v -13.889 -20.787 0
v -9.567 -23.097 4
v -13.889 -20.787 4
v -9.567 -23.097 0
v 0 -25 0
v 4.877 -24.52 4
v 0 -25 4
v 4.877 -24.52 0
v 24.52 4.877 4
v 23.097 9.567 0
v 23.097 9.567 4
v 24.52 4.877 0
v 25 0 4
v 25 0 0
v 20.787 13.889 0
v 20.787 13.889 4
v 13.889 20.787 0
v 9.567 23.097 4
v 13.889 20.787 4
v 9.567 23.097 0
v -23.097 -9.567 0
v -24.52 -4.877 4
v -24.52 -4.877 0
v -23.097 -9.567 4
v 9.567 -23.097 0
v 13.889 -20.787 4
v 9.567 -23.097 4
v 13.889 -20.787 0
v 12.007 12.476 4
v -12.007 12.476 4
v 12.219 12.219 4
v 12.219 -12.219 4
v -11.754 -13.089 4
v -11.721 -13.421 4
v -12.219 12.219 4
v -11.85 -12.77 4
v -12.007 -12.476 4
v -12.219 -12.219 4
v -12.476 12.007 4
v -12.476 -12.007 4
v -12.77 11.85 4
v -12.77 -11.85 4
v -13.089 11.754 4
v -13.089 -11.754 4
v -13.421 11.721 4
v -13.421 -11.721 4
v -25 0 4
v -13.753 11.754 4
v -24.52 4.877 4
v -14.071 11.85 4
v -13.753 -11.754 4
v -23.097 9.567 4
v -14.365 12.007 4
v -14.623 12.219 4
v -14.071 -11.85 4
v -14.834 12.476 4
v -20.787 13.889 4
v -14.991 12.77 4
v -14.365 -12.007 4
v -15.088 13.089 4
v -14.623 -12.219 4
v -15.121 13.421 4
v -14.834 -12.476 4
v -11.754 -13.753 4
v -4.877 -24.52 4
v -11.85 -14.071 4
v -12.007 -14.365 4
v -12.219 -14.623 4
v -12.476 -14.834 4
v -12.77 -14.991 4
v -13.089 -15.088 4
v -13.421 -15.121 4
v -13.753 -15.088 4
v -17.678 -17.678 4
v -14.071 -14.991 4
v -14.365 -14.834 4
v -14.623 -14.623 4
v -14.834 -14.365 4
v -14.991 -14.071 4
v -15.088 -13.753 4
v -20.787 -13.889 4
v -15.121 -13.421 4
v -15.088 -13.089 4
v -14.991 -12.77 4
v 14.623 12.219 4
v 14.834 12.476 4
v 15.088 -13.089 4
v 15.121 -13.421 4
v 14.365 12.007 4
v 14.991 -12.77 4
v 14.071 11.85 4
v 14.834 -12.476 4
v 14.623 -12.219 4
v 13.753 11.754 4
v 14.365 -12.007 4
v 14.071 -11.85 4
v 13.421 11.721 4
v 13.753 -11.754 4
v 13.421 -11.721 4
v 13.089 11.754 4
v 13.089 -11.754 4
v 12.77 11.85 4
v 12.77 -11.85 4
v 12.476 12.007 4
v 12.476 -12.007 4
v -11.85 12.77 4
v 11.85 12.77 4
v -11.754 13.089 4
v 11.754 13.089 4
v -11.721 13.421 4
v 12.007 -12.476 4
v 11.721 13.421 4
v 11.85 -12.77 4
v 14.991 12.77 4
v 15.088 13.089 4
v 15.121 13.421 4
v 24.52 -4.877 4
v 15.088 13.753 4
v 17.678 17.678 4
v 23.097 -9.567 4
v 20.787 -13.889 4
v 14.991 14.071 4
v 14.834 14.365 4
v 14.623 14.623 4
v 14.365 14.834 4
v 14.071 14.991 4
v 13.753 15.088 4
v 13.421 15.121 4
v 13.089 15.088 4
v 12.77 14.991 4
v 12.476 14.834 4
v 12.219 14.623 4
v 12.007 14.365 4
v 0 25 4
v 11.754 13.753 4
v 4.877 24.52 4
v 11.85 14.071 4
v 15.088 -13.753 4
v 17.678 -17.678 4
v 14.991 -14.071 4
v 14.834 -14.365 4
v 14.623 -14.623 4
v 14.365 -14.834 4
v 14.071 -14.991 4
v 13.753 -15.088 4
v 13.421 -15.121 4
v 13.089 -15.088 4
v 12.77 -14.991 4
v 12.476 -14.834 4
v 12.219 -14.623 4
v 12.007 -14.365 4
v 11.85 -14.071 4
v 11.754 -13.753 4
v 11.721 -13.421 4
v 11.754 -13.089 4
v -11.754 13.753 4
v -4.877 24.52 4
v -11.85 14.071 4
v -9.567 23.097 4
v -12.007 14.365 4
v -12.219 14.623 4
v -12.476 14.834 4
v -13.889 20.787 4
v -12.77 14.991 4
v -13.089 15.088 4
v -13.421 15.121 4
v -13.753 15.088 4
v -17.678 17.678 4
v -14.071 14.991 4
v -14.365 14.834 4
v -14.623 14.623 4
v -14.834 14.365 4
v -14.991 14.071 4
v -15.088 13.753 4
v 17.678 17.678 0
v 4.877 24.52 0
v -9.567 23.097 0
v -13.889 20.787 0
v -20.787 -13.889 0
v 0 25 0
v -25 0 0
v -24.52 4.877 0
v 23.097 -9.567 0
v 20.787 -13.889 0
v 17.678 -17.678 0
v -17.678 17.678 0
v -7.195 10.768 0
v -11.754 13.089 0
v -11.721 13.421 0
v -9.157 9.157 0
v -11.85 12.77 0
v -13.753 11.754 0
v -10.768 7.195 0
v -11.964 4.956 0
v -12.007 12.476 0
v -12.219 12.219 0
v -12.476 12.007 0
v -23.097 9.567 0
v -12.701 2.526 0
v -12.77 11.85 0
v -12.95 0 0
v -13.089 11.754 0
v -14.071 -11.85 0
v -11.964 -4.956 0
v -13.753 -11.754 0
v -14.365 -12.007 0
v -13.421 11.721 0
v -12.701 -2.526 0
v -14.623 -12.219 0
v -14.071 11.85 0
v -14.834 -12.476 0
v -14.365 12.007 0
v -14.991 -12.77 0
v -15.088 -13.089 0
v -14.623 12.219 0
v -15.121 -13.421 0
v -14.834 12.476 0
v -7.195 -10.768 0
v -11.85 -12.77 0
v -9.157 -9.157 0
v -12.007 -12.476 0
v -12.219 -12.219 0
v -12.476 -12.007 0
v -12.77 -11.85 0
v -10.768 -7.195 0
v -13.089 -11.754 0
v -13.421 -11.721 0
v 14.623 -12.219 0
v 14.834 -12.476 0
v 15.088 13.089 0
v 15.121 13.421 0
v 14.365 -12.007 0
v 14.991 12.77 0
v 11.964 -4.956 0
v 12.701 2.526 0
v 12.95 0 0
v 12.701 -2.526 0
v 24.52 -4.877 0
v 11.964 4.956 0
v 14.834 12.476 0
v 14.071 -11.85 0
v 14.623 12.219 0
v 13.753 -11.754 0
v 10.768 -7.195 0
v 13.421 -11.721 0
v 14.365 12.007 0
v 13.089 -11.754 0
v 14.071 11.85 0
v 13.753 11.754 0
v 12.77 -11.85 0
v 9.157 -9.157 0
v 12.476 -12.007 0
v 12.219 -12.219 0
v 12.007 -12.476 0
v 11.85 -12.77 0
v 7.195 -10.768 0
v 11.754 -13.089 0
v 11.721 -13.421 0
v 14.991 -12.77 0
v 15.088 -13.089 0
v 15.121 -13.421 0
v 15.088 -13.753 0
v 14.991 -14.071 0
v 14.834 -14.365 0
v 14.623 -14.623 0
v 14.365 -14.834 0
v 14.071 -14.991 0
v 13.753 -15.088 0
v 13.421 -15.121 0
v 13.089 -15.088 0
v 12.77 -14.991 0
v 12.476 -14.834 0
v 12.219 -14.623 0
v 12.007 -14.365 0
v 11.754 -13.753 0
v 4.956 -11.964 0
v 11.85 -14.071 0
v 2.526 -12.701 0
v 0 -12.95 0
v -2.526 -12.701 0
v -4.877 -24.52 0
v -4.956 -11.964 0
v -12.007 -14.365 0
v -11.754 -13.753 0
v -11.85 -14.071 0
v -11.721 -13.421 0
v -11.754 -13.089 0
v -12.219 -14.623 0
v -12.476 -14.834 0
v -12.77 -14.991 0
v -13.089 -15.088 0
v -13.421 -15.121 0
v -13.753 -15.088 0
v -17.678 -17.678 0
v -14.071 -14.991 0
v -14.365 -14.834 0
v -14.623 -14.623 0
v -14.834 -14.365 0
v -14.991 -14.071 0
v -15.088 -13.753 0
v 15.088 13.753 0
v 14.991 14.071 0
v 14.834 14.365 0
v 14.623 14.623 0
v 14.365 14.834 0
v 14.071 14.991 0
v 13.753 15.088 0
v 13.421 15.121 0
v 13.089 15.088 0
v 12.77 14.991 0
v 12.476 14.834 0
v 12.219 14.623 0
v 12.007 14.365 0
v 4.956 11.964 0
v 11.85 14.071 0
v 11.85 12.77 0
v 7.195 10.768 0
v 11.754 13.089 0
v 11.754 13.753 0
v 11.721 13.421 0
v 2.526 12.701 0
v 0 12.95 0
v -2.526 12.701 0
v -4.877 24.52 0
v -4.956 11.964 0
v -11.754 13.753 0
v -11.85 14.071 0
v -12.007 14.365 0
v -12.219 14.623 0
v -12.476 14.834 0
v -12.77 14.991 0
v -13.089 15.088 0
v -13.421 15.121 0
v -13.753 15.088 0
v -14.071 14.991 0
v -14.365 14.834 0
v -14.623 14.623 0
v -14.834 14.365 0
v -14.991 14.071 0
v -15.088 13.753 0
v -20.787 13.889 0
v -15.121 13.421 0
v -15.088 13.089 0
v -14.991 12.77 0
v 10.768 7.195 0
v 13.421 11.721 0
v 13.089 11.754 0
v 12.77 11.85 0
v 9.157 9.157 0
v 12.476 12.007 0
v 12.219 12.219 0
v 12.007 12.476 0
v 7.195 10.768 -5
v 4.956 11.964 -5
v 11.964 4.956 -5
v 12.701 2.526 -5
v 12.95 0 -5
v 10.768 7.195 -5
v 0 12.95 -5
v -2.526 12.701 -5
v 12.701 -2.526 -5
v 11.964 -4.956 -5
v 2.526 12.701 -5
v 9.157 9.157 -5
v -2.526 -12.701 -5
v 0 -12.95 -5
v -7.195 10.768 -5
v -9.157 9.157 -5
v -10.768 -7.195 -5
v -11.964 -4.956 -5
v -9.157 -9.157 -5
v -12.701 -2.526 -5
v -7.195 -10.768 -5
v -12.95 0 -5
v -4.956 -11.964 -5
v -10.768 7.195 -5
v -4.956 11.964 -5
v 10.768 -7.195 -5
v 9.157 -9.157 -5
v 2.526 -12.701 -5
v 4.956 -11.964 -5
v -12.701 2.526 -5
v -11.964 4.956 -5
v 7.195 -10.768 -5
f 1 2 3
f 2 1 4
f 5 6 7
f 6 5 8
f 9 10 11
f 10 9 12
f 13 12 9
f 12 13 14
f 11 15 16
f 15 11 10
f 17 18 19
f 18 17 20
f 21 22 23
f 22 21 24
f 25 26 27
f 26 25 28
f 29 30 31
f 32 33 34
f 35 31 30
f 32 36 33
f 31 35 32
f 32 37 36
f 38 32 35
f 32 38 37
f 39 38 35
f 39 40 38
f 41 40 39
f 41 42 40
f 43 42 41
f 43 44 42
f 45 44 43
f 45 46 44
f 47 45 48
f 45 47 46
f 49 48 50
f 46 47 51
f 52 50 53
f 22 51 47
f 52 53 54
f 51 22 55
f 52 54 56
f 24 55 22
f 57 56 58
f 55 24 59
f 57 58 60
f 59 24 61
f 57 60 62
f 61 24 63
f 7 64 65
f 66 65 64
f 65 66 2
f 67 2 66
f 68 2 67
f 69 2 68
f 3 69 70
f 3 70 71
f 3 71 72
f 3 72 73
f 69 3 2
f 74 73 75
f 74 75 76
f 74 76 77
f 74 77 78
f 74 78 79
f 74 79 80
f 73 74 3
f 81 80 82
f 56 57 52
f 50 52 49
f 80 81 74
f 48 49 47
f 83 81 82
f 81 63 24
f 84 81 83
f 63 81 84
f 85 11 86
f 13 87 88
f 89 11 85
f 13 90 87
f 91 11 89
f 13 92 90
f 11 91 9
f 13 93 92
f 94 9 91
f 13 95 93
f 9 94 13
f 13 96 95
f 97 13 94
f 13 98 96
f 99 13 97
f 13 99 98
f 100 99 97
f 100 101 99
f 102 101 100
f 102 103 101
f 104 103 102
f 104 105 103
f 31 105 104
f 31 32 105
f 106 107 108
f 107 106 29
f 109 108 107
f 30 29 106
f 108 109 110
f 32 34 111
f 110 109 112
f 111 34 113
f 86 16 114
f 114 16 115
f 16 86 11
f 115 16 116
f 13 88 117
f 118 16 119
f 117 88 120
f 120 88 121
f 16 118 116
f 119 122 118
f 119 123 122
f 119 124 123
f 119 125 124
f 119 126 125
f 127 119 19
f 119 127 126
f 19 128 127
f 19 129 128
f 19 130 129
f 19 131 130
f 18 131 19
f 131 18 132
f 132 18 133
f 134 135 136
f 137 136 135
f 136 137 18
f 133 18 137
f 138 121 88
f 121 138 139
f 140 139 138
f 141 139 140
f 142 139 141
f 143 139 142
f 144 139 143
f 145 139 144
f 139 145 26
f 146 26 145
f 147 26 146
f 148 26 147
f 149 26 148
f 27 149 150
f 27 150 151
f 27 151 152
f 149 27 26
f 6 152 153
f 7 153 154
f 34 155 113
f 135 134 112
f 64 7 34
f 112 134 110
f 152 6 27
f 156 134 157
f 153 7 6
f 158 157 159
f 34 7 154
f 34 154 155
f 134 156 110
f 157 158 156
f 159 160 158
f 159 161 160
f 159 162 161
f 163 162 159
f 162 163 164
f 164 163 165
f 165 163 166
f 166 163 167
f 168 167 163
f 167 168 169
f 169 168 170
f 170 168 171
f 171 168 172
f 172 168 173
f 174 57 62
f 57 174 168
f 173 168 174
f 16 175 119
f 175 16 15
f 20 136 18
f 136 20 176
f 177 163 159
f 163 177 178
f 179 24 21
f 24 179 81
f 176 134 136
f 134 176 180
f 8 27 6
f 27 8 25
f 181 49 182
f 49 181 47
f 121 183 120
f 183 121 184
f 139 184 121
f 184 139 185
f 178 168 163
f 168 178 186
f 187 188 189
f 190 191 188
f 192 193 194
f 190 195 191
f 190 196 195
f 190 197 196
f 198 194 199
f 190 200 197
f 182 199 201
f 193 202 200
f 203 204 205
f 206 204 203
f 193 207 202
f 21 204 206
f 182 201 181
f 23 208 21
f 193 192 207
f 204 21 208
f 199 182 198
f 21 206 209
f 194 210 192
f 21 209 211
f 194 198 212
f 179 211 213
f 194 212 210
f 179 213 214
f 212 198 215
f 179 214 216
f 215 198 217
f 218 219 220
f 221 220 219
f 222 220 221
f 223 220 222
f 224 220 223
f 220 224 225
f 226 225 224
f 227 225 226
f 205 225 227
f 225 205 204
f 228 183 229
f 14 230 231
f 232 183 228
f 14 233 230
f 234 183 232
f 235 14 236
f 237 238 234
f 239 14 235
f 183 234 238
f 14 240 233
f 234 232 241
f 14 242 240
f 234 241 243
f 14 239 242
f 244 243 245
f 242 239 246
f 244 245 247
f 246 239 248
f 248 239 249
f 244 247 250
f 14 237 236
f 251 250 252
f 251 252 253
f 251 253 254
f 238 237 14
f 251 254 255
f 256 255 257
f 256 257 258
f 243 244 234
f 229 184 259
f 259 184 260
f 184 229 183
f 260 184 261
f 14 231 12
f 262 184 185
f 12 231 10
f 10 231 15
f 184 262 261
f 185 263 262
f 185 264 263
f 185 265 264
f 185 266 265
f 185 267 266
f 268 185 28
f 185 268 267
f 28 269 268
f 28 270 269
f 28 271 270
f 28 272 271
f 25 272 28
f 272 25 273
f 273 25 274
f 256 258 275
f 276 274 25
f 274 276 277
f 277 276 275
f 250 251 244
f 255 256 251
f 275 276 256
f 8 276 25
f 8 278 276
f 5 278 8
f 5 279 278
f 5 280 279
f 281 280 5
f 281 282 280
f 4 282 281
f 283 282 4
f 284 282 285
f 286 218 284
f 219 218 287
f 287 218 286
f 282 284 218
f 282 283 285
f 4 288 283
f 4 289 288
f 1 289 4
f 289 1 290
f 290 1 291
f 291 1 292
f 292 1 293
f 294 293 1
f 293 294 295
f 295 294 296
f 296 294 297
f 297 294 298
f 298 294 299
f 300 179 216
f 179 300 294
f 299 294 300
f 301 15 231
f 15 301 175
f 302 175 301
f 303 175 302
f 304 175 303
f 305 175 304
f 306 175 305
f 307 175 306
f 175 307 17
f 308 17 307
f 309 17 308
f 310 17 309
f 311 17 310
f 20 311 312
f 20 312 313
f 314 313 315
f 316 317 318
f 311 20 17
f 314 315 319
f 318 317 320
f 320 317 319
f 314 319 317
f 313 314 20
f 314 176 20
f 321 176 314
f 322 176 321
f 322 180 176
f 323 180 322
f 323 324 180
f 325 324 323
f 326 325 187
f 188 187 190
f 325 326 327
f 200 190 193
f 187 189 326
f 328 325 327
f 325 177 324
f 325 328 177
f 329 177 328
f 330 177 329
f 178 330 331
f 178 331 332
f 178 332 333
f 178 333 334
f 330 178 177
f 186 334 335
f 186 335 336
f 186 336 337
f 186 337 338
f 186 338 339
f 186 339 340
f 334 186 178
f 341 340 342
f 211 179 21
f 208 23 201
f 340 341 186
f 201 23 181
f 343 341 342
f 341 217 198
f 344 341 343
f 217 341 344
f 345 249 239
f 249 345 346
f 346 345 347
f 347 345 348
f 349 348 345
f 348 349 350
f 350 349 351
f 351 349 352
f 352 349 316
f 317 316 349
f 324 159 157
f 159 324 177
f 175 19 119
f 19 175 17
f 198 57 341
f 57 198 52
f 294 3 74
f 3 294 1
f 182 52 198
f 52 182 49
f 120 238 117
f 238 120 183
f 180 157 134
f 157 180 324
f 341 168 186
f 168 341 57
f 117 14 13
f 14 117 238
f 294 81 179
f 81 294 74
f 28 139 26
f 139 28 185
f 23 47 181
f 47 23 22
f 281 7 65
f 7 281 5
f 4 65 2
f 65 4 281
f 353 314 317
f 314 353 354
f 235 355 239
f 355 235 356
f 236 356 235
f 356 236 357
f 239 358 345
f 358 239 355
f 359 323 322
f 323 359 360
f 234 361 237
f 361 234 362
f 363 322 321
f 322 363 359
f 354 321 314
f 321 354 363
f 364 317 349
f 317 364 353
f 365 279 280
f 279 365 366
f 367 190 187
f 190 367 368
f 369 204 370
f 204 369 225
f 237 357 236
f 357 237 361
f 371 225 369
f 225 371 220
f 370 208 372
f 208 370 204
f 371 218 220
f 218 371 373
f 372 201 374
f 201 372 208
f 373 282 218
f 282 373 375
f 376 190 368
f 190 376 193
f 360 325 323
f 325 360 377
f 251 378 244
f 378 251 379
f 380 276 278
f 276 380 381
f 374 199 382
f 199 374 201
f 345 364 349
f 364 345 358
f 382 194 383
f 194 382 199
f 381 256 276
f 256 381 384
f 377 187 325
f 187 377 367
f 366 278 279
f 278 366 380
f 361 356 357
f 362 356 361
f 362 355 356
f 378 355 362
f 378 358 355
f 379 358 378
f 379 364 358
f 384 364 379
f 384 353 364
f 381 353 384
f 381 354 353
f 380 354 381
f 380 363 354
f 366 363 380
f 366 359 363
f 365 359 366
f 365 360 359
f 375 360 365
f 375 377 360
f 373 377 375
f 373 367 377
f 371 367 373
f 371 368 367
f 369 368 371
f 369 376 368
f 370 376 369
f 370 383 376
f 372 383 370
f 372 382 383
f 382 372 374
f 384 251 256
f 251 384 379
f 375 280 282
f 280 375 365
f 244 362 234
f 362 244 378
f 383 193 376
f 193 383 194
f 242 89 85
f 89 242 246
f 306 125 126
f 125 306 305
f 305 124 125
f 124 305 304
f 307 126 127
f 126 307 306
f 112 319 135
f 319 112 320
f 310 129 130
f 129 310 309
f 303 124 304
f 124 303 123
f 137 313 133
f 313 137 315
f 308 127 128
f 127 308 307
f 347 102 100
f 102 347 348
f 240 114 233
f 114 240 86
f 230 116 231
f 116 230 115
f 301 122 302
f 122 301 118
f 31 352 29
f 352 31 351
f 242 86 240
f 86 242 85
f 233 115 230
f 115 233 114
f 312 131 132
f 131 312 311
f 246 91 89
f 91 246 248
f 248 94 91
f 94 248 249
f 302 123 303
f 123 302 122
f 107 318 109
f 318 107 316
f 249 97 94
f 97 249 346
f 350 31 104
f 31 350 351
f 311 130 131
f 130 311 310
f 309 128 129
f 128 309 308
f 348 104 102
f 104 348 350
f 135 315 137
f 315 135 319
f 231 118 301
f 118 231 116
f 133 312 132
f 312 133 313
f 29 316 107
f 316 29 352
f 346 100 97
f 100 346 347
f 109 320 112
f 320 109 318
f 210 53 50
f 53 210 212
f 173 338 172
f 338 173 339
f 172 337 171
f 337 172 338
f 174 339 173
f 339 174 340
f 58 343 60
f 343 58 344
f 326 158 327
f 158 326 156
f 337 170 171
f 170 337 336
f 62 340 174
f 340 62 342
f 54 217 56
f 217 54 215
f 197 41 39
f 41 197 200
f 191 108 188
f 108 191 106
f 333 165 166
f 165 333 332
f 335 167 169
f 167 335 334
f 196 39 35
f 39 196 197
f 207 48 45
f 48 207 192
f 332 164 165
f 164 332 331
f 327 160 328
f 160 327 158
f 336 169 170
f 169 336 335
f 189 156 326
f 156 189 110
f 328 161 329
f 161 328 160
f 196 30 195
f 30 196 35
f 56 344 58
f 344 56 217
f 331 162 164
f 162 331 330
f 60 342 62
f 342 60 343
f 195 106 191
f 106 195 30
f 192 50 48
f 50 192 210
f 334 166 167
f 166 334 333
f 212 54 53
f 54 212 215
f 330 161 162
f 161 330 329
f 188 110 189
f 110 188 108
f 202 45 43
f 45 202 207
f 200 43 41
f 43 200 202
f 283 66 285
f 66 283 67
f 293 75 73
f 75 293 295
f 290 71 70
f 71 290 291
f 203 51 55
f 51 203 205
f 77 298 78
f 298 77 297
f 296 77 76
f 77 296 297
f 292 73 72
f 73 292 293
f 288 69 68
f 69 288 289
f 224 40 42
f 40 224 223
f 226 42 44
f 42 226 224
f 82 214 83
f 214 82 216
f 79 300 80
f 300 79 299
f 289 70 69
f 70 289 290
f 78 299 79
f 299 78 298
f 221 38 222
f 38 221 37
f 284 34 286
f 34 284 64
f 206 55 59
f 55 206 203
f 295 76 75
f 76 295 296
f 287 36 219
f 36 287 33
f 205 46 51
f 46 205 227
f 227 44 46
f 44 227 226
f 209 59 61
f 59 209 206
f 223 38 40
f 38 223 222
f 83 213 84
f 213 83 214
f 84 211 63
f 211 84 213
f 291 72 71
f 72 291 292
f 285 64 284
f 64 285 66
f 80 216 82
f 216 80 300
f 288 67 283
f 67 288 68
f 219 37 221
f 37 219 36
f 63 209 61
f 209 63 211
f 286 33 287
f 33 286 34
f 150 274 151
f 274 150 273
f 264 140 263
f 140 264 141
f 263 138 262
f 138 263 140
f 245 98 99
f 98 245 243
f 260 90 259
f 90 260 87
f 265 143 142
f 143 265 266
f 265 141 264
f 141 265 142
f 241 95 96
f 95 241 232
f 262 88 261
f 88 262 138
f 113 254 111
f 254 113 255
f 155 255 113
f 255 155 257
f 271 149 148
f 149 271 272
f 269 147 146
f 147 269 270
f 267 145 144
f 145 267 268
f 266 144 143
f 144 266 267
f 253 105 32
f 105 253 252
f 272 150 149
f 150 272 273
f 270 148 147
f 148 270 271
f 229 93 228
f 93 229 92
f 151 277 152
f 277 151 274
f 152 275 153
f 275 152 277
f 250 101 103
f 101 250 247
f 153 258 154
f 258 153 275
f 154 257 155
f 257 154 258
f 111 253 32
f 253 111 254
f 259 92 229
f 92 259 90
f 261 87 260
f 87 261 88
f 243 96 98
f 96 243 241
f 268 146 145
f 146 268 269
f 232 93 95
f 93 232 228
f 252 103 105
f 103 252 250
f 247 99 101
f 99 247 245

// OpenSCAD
$fn = 32;

// ----------------------------------------------------------------------
// Retaining cap: 6000 cover, 50 mm, spigot 25.9 mm
// ----------------------------------------------------------------------

// --- parameters (mm) ---
cap_d = 50;               // cover diameter
cap_t = 4;                // cover thickness
lip_d = 25.9;             // spigot that enters the housing
lip_h = 5;                // spigot height
bolt_d = 3.4;             // bolt clearance
bolt_r = 18.98;           // bolt circle radius

module cover() {
  cylinder(h = cap_t, d = cap_d);
}

module spigot() {
  /* sunk 1 mm into the cover; the spigot sets the overall height */
  translate([0, 0, -lip_h]) cylinder(h = lip_h + 1, d = lip_d);
}

difference() {
  union() {
    cover();
    spigot();
  }
  for (i = [0 : 3]) rotate([0, 0, 45 + i * 90]) translate([bolt_r, 0, -lip_h - 1])
    cylinder(h = lip_h + cap_t + 2, d = bolt_d);
}
